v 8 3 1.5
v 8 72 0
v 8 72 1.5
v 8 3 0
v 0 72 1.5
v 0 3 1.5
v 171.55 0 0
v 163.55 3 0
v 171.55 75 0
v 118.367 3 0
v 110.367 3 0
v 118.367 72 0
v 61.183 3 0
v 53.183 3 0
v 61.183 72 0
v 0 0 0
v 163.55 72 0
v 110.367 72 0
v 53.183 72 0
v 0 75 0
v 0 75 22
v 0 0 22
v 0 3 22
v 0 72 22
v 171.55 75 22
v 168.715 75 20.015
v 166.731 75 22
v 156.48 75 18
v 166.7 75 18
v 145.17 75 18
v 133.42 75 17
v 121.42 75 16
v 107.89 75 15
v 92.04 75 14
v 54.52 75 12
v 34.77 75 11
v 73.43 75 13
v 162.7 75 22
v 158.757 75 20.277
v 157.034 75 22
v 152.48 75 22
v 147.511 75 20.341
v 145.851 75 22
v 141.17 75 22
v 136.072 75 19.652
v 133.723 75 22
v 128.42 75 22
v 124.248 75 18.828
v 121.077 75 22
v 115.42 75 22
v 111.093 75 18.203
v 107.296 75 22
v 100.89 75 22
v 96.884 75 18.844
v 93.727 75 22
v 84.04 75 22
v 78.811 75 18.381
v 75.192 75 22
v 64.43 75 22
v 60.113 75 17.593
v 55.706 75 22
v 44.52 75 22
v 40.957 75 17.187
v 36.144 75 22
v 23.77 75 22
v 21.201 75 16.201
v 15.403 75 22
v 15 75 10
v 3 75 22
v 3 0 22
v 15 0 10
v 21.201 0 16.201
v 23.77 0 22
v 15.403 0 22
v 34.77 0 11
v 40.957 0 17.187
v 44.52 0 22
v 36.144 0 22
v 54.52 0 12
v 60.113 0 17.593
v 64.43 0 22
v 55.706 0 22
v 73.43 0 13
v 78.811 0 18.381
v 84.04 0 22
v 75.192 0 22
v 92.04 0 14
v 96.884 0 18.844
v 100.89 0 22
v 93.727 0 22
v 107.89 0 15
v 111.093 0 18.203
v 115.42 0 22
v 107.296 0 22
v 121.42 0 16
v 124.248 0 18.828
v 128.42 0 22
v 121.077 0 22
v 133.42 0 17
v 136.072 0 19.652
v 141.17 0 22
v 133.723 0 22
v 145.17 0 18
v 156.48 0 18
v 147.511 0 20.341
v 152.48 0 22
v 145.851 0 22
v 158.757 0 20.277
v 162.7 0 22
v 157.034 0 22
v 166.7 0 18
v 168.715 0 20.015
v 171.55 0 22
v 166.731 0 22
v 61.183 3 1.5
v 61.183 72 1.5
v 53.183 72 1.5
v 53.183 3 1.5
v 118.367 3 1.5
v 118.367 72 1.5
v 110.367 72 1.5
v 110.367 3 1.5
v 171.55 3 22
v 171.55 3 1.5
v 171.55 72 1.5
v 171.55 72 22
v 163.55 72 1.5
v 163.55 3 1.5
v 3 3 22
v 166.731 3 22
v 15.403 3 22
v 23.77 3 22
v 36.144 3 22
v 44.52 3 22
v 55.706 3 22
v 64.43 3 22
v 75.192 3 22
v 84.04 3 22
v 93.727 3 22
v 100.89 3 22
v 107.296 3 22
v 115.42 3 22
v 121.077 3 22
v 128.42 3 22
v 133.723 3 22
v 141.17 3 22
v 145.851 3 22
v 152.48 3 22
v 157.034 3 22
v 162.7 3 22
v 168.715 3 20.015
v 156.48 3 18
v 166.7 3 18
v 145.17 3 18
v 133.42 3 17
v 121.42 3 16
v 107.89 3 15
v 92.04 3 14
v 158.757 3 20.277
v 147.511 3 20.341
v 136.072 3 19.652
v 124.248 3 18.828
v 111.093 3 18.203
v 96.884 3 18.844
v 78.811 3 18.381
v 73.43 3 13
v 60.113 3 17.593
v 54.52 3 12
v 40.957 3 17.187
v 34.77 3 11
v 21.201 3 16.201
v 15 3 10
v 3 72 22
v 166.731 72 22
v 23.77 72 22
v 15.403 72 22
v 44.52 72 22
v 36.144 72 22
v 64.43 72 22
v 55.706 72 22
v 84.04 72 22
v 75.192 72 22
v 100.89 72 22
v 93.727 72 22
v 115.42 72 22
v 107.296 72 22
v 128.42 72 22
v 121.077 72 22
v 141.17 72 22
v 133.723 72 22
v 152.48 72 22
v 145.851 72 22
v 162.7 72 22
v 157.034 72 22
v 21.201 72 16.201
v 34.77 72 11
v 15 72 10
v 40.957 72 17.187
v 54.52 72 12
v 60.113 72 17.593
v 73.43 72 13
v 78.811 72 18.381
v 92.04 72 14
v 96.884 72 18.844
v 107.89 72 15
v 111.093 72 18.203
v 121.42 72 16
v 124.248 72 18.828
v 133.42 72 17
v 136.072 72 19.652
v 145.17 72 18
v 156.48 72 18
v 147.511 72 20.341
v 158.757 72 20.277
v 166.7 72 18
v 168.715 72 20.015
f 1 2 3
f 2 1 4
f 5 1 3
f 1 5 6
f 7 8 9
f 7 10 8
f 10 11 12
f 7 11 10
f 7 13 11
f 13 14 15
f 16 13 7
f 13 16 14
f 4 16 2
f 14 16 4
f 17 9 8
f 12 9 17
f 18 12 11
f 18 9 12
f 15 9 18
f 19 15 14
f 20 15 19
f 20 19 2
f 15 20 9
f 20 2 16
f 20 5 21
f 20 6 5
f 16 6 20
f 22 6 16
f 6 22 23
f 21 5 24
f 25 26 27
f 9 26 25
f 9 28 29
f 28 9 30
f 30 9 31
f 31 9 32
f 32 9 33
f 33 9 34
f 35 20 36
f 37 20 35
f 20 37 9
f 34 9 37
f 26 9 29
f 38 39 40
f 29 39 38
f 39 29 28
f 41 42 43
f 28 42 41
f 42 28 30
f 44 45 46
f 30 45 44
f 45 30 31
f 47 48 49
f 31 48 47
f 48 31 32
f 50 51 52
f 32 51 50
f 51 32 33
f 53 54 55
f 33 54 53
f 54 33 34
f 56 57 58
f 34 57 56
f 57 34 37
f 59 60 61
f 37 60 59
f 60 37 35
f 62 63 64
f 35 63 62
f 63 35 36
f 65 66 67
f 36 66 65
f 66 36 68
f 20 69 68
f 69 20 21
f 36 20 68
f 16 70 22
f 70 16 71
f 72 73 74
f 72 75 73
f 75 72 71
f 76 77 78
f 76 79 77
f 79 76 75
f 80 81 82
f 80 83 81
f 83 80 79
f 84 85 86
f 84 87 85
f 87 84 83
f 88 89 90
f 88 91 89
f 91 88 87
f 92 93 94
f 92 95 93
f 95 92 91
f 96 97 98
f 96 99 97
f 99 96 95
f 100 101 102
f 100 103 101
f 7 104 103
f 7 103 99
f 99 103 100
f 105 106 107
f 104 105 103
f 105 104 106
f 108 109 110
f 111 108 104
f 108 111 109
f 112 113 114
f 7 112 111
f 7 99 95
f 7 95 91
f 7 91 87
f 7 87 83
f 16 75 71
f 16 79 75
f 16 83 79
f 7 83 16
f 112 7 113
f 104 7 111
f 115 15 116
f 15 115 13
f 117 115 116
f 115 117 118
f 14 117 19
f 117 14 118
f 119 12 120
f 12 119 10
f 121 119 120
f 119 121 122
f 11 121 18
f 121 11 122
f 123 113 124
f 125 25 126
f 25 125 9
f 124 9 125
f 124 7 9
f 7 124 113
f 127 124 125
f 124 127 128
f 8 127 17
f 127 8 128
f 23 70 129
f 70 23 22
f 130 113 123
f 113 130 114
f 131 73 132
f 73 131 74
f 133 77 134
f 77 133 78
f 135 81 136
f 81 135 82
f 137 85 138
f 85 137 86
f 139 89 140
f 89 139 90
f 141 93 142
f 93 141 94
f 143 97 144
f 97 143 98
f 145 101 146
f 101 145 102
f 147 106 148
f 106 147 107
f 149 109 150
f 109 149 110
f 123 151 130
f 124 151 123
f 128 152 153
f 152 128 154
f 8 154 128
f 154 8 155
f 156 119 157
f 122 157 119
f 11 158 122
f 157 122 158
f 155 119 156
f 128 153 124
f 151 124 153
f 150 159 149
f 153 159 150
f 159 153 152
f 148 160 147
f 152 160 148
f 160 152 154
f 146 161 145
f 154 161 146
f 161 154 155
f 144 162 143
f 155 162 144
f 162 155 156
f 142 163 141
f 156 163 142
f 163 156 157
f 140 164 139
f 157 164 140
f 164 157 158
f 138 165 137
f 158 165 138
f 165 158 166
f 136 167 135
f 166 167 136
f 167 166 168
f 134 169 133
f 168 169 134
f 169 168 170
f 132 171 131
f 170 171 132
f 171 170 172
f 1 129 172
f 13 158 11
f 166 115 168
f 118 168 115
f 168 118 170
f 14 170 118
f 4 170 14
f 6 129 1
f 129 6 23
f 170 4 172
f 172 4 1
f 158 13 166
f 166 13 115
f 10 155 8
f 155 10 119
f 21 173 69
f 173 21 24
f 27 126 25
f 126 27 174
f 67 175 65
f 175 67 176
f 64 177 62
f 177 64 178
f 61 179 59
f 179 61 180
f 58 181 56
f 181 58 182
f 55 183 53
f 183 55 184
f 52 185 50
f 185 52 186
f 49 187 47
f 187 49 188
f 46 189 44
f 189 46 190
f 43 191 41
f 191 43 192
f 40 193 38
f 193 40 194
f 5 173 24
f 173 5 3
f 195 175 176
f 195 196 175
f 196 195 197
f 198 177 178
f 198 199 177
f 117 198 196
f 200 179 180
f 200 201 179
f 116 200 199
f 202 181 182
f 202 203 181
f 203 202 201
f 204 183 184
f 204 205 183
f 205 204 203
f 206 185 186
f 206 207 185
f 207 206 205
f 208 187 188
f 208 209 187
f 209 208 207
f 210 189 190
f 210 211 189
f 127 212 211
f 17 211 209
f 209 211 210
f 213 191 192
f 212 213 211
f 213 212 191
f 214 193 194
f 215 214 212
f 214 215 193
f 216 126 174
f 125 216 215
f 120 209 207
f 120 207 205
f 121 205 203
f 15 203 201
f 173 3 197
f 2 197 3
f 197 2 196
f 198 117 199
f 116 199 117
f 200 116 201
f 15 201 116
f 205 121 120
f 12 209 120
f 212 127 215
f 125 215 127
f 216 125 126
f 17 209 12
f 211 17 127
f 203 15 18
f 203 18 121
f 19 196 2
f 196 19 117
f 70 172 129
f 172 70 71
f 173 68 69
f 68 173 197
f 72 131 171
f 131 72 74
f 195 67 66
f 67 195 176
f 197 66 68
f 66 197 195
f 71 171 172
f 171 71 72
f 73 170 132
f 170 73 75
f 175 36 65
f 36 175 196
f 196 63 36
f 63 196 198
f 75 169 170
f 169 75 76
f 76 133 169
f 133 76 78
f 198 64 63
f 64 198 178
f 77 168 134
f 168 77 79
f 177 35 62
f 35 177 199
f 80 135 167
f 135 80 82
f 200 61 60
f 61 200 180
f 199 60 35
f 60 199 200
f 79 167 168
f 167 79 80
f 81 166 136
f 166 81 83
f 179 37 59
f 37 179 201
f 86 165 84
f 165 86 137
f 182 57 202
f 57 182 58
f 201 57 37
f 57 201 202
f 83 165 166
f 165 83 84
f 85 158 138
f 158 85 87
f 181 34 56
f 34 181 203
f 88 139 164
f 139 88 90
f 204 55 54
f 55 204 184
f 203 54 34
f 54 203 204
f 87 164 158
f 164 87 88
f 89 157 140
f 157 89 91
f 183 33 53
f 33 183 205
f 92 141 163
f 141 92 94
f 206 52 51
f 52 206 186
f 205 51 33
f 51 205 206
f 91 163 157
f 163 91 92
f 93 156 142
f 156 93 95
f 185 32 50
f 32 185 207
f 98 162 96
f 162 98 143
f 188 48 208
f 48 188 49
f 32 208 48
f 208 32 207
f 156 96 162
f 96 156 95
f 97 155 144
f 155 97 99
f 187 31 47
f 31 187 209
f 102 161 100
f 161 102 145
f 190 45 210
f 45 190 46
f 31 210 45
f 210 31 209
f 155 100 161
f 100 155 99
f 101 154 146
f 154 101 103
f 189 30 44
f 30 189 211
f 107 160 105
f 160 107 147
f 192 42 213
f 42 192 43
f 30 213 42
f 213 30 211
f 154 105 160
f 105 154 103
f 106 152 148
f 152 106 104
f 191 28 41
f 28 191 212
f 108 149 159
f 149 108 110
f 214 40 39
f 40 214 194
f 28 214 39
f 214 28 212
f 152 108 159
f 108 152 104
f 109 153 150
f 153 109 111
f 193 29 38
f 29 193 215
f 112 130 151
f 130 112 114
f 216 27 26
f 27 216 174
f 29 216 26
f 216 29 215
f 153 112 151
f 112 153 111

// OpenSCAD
widths        = [  8.77,  8.75,  7.91,  7.61,  6.85,  4.53,  4.00,  3.75,  3.31,  3.22,  2.85];
spacing       = [ 11,    11,    11,    11,     9,     9,     8,     8,     8,     7,     7];
pocket_depth  = [ 12,    11,    10,     9,     8,     7,     6,     5,     4,     4,     4];
imprint_width = [111,   109,    98,    87,    77,    66,    55,    55,    55,    55,    55];

base_width  = 75.0;
rail_width  =  3.0;
rail_height = 22.0;

function sum (v, i = 0, r = 0) = i < len (v) ? sum (v, i + 1, r + v [i]) : r;
function subarray (list, begin = 0, end = -1) = [
  let (end = end < 0 ? len (list) : end)
    for (i = [begin : 1 : end - 1])
      list [i]
];

length = sum (widths) + sum (spacing) + 10;

difference () {
  union () {
    for (i = [0 : 3]) 
      translate ([i == 0 ? 0 : ((length / 3) * i) - (i == 3 ? 8 : 4), 0, 0])
        cube ([8, base_width, 1.5]);
    translate ([0, 0, 0])
      cube ([length, rail_width, rail_height]);
    translate ([0, base_width - rail_width, 0])
      cube ([length, rail_width, rail_height]);
  }

  for (i = [0 : len (widths) - 1]) {
    translate ([15 + sum (subarray (spacing, 0, i)) + sum (subarray (widths, 0, i)), -0.01, rail_height - pocket_depth [i]])
      rotate ([0, 315, 0])
        cube ([widths [i], base_width + 0.02, 25]);
  }
}
